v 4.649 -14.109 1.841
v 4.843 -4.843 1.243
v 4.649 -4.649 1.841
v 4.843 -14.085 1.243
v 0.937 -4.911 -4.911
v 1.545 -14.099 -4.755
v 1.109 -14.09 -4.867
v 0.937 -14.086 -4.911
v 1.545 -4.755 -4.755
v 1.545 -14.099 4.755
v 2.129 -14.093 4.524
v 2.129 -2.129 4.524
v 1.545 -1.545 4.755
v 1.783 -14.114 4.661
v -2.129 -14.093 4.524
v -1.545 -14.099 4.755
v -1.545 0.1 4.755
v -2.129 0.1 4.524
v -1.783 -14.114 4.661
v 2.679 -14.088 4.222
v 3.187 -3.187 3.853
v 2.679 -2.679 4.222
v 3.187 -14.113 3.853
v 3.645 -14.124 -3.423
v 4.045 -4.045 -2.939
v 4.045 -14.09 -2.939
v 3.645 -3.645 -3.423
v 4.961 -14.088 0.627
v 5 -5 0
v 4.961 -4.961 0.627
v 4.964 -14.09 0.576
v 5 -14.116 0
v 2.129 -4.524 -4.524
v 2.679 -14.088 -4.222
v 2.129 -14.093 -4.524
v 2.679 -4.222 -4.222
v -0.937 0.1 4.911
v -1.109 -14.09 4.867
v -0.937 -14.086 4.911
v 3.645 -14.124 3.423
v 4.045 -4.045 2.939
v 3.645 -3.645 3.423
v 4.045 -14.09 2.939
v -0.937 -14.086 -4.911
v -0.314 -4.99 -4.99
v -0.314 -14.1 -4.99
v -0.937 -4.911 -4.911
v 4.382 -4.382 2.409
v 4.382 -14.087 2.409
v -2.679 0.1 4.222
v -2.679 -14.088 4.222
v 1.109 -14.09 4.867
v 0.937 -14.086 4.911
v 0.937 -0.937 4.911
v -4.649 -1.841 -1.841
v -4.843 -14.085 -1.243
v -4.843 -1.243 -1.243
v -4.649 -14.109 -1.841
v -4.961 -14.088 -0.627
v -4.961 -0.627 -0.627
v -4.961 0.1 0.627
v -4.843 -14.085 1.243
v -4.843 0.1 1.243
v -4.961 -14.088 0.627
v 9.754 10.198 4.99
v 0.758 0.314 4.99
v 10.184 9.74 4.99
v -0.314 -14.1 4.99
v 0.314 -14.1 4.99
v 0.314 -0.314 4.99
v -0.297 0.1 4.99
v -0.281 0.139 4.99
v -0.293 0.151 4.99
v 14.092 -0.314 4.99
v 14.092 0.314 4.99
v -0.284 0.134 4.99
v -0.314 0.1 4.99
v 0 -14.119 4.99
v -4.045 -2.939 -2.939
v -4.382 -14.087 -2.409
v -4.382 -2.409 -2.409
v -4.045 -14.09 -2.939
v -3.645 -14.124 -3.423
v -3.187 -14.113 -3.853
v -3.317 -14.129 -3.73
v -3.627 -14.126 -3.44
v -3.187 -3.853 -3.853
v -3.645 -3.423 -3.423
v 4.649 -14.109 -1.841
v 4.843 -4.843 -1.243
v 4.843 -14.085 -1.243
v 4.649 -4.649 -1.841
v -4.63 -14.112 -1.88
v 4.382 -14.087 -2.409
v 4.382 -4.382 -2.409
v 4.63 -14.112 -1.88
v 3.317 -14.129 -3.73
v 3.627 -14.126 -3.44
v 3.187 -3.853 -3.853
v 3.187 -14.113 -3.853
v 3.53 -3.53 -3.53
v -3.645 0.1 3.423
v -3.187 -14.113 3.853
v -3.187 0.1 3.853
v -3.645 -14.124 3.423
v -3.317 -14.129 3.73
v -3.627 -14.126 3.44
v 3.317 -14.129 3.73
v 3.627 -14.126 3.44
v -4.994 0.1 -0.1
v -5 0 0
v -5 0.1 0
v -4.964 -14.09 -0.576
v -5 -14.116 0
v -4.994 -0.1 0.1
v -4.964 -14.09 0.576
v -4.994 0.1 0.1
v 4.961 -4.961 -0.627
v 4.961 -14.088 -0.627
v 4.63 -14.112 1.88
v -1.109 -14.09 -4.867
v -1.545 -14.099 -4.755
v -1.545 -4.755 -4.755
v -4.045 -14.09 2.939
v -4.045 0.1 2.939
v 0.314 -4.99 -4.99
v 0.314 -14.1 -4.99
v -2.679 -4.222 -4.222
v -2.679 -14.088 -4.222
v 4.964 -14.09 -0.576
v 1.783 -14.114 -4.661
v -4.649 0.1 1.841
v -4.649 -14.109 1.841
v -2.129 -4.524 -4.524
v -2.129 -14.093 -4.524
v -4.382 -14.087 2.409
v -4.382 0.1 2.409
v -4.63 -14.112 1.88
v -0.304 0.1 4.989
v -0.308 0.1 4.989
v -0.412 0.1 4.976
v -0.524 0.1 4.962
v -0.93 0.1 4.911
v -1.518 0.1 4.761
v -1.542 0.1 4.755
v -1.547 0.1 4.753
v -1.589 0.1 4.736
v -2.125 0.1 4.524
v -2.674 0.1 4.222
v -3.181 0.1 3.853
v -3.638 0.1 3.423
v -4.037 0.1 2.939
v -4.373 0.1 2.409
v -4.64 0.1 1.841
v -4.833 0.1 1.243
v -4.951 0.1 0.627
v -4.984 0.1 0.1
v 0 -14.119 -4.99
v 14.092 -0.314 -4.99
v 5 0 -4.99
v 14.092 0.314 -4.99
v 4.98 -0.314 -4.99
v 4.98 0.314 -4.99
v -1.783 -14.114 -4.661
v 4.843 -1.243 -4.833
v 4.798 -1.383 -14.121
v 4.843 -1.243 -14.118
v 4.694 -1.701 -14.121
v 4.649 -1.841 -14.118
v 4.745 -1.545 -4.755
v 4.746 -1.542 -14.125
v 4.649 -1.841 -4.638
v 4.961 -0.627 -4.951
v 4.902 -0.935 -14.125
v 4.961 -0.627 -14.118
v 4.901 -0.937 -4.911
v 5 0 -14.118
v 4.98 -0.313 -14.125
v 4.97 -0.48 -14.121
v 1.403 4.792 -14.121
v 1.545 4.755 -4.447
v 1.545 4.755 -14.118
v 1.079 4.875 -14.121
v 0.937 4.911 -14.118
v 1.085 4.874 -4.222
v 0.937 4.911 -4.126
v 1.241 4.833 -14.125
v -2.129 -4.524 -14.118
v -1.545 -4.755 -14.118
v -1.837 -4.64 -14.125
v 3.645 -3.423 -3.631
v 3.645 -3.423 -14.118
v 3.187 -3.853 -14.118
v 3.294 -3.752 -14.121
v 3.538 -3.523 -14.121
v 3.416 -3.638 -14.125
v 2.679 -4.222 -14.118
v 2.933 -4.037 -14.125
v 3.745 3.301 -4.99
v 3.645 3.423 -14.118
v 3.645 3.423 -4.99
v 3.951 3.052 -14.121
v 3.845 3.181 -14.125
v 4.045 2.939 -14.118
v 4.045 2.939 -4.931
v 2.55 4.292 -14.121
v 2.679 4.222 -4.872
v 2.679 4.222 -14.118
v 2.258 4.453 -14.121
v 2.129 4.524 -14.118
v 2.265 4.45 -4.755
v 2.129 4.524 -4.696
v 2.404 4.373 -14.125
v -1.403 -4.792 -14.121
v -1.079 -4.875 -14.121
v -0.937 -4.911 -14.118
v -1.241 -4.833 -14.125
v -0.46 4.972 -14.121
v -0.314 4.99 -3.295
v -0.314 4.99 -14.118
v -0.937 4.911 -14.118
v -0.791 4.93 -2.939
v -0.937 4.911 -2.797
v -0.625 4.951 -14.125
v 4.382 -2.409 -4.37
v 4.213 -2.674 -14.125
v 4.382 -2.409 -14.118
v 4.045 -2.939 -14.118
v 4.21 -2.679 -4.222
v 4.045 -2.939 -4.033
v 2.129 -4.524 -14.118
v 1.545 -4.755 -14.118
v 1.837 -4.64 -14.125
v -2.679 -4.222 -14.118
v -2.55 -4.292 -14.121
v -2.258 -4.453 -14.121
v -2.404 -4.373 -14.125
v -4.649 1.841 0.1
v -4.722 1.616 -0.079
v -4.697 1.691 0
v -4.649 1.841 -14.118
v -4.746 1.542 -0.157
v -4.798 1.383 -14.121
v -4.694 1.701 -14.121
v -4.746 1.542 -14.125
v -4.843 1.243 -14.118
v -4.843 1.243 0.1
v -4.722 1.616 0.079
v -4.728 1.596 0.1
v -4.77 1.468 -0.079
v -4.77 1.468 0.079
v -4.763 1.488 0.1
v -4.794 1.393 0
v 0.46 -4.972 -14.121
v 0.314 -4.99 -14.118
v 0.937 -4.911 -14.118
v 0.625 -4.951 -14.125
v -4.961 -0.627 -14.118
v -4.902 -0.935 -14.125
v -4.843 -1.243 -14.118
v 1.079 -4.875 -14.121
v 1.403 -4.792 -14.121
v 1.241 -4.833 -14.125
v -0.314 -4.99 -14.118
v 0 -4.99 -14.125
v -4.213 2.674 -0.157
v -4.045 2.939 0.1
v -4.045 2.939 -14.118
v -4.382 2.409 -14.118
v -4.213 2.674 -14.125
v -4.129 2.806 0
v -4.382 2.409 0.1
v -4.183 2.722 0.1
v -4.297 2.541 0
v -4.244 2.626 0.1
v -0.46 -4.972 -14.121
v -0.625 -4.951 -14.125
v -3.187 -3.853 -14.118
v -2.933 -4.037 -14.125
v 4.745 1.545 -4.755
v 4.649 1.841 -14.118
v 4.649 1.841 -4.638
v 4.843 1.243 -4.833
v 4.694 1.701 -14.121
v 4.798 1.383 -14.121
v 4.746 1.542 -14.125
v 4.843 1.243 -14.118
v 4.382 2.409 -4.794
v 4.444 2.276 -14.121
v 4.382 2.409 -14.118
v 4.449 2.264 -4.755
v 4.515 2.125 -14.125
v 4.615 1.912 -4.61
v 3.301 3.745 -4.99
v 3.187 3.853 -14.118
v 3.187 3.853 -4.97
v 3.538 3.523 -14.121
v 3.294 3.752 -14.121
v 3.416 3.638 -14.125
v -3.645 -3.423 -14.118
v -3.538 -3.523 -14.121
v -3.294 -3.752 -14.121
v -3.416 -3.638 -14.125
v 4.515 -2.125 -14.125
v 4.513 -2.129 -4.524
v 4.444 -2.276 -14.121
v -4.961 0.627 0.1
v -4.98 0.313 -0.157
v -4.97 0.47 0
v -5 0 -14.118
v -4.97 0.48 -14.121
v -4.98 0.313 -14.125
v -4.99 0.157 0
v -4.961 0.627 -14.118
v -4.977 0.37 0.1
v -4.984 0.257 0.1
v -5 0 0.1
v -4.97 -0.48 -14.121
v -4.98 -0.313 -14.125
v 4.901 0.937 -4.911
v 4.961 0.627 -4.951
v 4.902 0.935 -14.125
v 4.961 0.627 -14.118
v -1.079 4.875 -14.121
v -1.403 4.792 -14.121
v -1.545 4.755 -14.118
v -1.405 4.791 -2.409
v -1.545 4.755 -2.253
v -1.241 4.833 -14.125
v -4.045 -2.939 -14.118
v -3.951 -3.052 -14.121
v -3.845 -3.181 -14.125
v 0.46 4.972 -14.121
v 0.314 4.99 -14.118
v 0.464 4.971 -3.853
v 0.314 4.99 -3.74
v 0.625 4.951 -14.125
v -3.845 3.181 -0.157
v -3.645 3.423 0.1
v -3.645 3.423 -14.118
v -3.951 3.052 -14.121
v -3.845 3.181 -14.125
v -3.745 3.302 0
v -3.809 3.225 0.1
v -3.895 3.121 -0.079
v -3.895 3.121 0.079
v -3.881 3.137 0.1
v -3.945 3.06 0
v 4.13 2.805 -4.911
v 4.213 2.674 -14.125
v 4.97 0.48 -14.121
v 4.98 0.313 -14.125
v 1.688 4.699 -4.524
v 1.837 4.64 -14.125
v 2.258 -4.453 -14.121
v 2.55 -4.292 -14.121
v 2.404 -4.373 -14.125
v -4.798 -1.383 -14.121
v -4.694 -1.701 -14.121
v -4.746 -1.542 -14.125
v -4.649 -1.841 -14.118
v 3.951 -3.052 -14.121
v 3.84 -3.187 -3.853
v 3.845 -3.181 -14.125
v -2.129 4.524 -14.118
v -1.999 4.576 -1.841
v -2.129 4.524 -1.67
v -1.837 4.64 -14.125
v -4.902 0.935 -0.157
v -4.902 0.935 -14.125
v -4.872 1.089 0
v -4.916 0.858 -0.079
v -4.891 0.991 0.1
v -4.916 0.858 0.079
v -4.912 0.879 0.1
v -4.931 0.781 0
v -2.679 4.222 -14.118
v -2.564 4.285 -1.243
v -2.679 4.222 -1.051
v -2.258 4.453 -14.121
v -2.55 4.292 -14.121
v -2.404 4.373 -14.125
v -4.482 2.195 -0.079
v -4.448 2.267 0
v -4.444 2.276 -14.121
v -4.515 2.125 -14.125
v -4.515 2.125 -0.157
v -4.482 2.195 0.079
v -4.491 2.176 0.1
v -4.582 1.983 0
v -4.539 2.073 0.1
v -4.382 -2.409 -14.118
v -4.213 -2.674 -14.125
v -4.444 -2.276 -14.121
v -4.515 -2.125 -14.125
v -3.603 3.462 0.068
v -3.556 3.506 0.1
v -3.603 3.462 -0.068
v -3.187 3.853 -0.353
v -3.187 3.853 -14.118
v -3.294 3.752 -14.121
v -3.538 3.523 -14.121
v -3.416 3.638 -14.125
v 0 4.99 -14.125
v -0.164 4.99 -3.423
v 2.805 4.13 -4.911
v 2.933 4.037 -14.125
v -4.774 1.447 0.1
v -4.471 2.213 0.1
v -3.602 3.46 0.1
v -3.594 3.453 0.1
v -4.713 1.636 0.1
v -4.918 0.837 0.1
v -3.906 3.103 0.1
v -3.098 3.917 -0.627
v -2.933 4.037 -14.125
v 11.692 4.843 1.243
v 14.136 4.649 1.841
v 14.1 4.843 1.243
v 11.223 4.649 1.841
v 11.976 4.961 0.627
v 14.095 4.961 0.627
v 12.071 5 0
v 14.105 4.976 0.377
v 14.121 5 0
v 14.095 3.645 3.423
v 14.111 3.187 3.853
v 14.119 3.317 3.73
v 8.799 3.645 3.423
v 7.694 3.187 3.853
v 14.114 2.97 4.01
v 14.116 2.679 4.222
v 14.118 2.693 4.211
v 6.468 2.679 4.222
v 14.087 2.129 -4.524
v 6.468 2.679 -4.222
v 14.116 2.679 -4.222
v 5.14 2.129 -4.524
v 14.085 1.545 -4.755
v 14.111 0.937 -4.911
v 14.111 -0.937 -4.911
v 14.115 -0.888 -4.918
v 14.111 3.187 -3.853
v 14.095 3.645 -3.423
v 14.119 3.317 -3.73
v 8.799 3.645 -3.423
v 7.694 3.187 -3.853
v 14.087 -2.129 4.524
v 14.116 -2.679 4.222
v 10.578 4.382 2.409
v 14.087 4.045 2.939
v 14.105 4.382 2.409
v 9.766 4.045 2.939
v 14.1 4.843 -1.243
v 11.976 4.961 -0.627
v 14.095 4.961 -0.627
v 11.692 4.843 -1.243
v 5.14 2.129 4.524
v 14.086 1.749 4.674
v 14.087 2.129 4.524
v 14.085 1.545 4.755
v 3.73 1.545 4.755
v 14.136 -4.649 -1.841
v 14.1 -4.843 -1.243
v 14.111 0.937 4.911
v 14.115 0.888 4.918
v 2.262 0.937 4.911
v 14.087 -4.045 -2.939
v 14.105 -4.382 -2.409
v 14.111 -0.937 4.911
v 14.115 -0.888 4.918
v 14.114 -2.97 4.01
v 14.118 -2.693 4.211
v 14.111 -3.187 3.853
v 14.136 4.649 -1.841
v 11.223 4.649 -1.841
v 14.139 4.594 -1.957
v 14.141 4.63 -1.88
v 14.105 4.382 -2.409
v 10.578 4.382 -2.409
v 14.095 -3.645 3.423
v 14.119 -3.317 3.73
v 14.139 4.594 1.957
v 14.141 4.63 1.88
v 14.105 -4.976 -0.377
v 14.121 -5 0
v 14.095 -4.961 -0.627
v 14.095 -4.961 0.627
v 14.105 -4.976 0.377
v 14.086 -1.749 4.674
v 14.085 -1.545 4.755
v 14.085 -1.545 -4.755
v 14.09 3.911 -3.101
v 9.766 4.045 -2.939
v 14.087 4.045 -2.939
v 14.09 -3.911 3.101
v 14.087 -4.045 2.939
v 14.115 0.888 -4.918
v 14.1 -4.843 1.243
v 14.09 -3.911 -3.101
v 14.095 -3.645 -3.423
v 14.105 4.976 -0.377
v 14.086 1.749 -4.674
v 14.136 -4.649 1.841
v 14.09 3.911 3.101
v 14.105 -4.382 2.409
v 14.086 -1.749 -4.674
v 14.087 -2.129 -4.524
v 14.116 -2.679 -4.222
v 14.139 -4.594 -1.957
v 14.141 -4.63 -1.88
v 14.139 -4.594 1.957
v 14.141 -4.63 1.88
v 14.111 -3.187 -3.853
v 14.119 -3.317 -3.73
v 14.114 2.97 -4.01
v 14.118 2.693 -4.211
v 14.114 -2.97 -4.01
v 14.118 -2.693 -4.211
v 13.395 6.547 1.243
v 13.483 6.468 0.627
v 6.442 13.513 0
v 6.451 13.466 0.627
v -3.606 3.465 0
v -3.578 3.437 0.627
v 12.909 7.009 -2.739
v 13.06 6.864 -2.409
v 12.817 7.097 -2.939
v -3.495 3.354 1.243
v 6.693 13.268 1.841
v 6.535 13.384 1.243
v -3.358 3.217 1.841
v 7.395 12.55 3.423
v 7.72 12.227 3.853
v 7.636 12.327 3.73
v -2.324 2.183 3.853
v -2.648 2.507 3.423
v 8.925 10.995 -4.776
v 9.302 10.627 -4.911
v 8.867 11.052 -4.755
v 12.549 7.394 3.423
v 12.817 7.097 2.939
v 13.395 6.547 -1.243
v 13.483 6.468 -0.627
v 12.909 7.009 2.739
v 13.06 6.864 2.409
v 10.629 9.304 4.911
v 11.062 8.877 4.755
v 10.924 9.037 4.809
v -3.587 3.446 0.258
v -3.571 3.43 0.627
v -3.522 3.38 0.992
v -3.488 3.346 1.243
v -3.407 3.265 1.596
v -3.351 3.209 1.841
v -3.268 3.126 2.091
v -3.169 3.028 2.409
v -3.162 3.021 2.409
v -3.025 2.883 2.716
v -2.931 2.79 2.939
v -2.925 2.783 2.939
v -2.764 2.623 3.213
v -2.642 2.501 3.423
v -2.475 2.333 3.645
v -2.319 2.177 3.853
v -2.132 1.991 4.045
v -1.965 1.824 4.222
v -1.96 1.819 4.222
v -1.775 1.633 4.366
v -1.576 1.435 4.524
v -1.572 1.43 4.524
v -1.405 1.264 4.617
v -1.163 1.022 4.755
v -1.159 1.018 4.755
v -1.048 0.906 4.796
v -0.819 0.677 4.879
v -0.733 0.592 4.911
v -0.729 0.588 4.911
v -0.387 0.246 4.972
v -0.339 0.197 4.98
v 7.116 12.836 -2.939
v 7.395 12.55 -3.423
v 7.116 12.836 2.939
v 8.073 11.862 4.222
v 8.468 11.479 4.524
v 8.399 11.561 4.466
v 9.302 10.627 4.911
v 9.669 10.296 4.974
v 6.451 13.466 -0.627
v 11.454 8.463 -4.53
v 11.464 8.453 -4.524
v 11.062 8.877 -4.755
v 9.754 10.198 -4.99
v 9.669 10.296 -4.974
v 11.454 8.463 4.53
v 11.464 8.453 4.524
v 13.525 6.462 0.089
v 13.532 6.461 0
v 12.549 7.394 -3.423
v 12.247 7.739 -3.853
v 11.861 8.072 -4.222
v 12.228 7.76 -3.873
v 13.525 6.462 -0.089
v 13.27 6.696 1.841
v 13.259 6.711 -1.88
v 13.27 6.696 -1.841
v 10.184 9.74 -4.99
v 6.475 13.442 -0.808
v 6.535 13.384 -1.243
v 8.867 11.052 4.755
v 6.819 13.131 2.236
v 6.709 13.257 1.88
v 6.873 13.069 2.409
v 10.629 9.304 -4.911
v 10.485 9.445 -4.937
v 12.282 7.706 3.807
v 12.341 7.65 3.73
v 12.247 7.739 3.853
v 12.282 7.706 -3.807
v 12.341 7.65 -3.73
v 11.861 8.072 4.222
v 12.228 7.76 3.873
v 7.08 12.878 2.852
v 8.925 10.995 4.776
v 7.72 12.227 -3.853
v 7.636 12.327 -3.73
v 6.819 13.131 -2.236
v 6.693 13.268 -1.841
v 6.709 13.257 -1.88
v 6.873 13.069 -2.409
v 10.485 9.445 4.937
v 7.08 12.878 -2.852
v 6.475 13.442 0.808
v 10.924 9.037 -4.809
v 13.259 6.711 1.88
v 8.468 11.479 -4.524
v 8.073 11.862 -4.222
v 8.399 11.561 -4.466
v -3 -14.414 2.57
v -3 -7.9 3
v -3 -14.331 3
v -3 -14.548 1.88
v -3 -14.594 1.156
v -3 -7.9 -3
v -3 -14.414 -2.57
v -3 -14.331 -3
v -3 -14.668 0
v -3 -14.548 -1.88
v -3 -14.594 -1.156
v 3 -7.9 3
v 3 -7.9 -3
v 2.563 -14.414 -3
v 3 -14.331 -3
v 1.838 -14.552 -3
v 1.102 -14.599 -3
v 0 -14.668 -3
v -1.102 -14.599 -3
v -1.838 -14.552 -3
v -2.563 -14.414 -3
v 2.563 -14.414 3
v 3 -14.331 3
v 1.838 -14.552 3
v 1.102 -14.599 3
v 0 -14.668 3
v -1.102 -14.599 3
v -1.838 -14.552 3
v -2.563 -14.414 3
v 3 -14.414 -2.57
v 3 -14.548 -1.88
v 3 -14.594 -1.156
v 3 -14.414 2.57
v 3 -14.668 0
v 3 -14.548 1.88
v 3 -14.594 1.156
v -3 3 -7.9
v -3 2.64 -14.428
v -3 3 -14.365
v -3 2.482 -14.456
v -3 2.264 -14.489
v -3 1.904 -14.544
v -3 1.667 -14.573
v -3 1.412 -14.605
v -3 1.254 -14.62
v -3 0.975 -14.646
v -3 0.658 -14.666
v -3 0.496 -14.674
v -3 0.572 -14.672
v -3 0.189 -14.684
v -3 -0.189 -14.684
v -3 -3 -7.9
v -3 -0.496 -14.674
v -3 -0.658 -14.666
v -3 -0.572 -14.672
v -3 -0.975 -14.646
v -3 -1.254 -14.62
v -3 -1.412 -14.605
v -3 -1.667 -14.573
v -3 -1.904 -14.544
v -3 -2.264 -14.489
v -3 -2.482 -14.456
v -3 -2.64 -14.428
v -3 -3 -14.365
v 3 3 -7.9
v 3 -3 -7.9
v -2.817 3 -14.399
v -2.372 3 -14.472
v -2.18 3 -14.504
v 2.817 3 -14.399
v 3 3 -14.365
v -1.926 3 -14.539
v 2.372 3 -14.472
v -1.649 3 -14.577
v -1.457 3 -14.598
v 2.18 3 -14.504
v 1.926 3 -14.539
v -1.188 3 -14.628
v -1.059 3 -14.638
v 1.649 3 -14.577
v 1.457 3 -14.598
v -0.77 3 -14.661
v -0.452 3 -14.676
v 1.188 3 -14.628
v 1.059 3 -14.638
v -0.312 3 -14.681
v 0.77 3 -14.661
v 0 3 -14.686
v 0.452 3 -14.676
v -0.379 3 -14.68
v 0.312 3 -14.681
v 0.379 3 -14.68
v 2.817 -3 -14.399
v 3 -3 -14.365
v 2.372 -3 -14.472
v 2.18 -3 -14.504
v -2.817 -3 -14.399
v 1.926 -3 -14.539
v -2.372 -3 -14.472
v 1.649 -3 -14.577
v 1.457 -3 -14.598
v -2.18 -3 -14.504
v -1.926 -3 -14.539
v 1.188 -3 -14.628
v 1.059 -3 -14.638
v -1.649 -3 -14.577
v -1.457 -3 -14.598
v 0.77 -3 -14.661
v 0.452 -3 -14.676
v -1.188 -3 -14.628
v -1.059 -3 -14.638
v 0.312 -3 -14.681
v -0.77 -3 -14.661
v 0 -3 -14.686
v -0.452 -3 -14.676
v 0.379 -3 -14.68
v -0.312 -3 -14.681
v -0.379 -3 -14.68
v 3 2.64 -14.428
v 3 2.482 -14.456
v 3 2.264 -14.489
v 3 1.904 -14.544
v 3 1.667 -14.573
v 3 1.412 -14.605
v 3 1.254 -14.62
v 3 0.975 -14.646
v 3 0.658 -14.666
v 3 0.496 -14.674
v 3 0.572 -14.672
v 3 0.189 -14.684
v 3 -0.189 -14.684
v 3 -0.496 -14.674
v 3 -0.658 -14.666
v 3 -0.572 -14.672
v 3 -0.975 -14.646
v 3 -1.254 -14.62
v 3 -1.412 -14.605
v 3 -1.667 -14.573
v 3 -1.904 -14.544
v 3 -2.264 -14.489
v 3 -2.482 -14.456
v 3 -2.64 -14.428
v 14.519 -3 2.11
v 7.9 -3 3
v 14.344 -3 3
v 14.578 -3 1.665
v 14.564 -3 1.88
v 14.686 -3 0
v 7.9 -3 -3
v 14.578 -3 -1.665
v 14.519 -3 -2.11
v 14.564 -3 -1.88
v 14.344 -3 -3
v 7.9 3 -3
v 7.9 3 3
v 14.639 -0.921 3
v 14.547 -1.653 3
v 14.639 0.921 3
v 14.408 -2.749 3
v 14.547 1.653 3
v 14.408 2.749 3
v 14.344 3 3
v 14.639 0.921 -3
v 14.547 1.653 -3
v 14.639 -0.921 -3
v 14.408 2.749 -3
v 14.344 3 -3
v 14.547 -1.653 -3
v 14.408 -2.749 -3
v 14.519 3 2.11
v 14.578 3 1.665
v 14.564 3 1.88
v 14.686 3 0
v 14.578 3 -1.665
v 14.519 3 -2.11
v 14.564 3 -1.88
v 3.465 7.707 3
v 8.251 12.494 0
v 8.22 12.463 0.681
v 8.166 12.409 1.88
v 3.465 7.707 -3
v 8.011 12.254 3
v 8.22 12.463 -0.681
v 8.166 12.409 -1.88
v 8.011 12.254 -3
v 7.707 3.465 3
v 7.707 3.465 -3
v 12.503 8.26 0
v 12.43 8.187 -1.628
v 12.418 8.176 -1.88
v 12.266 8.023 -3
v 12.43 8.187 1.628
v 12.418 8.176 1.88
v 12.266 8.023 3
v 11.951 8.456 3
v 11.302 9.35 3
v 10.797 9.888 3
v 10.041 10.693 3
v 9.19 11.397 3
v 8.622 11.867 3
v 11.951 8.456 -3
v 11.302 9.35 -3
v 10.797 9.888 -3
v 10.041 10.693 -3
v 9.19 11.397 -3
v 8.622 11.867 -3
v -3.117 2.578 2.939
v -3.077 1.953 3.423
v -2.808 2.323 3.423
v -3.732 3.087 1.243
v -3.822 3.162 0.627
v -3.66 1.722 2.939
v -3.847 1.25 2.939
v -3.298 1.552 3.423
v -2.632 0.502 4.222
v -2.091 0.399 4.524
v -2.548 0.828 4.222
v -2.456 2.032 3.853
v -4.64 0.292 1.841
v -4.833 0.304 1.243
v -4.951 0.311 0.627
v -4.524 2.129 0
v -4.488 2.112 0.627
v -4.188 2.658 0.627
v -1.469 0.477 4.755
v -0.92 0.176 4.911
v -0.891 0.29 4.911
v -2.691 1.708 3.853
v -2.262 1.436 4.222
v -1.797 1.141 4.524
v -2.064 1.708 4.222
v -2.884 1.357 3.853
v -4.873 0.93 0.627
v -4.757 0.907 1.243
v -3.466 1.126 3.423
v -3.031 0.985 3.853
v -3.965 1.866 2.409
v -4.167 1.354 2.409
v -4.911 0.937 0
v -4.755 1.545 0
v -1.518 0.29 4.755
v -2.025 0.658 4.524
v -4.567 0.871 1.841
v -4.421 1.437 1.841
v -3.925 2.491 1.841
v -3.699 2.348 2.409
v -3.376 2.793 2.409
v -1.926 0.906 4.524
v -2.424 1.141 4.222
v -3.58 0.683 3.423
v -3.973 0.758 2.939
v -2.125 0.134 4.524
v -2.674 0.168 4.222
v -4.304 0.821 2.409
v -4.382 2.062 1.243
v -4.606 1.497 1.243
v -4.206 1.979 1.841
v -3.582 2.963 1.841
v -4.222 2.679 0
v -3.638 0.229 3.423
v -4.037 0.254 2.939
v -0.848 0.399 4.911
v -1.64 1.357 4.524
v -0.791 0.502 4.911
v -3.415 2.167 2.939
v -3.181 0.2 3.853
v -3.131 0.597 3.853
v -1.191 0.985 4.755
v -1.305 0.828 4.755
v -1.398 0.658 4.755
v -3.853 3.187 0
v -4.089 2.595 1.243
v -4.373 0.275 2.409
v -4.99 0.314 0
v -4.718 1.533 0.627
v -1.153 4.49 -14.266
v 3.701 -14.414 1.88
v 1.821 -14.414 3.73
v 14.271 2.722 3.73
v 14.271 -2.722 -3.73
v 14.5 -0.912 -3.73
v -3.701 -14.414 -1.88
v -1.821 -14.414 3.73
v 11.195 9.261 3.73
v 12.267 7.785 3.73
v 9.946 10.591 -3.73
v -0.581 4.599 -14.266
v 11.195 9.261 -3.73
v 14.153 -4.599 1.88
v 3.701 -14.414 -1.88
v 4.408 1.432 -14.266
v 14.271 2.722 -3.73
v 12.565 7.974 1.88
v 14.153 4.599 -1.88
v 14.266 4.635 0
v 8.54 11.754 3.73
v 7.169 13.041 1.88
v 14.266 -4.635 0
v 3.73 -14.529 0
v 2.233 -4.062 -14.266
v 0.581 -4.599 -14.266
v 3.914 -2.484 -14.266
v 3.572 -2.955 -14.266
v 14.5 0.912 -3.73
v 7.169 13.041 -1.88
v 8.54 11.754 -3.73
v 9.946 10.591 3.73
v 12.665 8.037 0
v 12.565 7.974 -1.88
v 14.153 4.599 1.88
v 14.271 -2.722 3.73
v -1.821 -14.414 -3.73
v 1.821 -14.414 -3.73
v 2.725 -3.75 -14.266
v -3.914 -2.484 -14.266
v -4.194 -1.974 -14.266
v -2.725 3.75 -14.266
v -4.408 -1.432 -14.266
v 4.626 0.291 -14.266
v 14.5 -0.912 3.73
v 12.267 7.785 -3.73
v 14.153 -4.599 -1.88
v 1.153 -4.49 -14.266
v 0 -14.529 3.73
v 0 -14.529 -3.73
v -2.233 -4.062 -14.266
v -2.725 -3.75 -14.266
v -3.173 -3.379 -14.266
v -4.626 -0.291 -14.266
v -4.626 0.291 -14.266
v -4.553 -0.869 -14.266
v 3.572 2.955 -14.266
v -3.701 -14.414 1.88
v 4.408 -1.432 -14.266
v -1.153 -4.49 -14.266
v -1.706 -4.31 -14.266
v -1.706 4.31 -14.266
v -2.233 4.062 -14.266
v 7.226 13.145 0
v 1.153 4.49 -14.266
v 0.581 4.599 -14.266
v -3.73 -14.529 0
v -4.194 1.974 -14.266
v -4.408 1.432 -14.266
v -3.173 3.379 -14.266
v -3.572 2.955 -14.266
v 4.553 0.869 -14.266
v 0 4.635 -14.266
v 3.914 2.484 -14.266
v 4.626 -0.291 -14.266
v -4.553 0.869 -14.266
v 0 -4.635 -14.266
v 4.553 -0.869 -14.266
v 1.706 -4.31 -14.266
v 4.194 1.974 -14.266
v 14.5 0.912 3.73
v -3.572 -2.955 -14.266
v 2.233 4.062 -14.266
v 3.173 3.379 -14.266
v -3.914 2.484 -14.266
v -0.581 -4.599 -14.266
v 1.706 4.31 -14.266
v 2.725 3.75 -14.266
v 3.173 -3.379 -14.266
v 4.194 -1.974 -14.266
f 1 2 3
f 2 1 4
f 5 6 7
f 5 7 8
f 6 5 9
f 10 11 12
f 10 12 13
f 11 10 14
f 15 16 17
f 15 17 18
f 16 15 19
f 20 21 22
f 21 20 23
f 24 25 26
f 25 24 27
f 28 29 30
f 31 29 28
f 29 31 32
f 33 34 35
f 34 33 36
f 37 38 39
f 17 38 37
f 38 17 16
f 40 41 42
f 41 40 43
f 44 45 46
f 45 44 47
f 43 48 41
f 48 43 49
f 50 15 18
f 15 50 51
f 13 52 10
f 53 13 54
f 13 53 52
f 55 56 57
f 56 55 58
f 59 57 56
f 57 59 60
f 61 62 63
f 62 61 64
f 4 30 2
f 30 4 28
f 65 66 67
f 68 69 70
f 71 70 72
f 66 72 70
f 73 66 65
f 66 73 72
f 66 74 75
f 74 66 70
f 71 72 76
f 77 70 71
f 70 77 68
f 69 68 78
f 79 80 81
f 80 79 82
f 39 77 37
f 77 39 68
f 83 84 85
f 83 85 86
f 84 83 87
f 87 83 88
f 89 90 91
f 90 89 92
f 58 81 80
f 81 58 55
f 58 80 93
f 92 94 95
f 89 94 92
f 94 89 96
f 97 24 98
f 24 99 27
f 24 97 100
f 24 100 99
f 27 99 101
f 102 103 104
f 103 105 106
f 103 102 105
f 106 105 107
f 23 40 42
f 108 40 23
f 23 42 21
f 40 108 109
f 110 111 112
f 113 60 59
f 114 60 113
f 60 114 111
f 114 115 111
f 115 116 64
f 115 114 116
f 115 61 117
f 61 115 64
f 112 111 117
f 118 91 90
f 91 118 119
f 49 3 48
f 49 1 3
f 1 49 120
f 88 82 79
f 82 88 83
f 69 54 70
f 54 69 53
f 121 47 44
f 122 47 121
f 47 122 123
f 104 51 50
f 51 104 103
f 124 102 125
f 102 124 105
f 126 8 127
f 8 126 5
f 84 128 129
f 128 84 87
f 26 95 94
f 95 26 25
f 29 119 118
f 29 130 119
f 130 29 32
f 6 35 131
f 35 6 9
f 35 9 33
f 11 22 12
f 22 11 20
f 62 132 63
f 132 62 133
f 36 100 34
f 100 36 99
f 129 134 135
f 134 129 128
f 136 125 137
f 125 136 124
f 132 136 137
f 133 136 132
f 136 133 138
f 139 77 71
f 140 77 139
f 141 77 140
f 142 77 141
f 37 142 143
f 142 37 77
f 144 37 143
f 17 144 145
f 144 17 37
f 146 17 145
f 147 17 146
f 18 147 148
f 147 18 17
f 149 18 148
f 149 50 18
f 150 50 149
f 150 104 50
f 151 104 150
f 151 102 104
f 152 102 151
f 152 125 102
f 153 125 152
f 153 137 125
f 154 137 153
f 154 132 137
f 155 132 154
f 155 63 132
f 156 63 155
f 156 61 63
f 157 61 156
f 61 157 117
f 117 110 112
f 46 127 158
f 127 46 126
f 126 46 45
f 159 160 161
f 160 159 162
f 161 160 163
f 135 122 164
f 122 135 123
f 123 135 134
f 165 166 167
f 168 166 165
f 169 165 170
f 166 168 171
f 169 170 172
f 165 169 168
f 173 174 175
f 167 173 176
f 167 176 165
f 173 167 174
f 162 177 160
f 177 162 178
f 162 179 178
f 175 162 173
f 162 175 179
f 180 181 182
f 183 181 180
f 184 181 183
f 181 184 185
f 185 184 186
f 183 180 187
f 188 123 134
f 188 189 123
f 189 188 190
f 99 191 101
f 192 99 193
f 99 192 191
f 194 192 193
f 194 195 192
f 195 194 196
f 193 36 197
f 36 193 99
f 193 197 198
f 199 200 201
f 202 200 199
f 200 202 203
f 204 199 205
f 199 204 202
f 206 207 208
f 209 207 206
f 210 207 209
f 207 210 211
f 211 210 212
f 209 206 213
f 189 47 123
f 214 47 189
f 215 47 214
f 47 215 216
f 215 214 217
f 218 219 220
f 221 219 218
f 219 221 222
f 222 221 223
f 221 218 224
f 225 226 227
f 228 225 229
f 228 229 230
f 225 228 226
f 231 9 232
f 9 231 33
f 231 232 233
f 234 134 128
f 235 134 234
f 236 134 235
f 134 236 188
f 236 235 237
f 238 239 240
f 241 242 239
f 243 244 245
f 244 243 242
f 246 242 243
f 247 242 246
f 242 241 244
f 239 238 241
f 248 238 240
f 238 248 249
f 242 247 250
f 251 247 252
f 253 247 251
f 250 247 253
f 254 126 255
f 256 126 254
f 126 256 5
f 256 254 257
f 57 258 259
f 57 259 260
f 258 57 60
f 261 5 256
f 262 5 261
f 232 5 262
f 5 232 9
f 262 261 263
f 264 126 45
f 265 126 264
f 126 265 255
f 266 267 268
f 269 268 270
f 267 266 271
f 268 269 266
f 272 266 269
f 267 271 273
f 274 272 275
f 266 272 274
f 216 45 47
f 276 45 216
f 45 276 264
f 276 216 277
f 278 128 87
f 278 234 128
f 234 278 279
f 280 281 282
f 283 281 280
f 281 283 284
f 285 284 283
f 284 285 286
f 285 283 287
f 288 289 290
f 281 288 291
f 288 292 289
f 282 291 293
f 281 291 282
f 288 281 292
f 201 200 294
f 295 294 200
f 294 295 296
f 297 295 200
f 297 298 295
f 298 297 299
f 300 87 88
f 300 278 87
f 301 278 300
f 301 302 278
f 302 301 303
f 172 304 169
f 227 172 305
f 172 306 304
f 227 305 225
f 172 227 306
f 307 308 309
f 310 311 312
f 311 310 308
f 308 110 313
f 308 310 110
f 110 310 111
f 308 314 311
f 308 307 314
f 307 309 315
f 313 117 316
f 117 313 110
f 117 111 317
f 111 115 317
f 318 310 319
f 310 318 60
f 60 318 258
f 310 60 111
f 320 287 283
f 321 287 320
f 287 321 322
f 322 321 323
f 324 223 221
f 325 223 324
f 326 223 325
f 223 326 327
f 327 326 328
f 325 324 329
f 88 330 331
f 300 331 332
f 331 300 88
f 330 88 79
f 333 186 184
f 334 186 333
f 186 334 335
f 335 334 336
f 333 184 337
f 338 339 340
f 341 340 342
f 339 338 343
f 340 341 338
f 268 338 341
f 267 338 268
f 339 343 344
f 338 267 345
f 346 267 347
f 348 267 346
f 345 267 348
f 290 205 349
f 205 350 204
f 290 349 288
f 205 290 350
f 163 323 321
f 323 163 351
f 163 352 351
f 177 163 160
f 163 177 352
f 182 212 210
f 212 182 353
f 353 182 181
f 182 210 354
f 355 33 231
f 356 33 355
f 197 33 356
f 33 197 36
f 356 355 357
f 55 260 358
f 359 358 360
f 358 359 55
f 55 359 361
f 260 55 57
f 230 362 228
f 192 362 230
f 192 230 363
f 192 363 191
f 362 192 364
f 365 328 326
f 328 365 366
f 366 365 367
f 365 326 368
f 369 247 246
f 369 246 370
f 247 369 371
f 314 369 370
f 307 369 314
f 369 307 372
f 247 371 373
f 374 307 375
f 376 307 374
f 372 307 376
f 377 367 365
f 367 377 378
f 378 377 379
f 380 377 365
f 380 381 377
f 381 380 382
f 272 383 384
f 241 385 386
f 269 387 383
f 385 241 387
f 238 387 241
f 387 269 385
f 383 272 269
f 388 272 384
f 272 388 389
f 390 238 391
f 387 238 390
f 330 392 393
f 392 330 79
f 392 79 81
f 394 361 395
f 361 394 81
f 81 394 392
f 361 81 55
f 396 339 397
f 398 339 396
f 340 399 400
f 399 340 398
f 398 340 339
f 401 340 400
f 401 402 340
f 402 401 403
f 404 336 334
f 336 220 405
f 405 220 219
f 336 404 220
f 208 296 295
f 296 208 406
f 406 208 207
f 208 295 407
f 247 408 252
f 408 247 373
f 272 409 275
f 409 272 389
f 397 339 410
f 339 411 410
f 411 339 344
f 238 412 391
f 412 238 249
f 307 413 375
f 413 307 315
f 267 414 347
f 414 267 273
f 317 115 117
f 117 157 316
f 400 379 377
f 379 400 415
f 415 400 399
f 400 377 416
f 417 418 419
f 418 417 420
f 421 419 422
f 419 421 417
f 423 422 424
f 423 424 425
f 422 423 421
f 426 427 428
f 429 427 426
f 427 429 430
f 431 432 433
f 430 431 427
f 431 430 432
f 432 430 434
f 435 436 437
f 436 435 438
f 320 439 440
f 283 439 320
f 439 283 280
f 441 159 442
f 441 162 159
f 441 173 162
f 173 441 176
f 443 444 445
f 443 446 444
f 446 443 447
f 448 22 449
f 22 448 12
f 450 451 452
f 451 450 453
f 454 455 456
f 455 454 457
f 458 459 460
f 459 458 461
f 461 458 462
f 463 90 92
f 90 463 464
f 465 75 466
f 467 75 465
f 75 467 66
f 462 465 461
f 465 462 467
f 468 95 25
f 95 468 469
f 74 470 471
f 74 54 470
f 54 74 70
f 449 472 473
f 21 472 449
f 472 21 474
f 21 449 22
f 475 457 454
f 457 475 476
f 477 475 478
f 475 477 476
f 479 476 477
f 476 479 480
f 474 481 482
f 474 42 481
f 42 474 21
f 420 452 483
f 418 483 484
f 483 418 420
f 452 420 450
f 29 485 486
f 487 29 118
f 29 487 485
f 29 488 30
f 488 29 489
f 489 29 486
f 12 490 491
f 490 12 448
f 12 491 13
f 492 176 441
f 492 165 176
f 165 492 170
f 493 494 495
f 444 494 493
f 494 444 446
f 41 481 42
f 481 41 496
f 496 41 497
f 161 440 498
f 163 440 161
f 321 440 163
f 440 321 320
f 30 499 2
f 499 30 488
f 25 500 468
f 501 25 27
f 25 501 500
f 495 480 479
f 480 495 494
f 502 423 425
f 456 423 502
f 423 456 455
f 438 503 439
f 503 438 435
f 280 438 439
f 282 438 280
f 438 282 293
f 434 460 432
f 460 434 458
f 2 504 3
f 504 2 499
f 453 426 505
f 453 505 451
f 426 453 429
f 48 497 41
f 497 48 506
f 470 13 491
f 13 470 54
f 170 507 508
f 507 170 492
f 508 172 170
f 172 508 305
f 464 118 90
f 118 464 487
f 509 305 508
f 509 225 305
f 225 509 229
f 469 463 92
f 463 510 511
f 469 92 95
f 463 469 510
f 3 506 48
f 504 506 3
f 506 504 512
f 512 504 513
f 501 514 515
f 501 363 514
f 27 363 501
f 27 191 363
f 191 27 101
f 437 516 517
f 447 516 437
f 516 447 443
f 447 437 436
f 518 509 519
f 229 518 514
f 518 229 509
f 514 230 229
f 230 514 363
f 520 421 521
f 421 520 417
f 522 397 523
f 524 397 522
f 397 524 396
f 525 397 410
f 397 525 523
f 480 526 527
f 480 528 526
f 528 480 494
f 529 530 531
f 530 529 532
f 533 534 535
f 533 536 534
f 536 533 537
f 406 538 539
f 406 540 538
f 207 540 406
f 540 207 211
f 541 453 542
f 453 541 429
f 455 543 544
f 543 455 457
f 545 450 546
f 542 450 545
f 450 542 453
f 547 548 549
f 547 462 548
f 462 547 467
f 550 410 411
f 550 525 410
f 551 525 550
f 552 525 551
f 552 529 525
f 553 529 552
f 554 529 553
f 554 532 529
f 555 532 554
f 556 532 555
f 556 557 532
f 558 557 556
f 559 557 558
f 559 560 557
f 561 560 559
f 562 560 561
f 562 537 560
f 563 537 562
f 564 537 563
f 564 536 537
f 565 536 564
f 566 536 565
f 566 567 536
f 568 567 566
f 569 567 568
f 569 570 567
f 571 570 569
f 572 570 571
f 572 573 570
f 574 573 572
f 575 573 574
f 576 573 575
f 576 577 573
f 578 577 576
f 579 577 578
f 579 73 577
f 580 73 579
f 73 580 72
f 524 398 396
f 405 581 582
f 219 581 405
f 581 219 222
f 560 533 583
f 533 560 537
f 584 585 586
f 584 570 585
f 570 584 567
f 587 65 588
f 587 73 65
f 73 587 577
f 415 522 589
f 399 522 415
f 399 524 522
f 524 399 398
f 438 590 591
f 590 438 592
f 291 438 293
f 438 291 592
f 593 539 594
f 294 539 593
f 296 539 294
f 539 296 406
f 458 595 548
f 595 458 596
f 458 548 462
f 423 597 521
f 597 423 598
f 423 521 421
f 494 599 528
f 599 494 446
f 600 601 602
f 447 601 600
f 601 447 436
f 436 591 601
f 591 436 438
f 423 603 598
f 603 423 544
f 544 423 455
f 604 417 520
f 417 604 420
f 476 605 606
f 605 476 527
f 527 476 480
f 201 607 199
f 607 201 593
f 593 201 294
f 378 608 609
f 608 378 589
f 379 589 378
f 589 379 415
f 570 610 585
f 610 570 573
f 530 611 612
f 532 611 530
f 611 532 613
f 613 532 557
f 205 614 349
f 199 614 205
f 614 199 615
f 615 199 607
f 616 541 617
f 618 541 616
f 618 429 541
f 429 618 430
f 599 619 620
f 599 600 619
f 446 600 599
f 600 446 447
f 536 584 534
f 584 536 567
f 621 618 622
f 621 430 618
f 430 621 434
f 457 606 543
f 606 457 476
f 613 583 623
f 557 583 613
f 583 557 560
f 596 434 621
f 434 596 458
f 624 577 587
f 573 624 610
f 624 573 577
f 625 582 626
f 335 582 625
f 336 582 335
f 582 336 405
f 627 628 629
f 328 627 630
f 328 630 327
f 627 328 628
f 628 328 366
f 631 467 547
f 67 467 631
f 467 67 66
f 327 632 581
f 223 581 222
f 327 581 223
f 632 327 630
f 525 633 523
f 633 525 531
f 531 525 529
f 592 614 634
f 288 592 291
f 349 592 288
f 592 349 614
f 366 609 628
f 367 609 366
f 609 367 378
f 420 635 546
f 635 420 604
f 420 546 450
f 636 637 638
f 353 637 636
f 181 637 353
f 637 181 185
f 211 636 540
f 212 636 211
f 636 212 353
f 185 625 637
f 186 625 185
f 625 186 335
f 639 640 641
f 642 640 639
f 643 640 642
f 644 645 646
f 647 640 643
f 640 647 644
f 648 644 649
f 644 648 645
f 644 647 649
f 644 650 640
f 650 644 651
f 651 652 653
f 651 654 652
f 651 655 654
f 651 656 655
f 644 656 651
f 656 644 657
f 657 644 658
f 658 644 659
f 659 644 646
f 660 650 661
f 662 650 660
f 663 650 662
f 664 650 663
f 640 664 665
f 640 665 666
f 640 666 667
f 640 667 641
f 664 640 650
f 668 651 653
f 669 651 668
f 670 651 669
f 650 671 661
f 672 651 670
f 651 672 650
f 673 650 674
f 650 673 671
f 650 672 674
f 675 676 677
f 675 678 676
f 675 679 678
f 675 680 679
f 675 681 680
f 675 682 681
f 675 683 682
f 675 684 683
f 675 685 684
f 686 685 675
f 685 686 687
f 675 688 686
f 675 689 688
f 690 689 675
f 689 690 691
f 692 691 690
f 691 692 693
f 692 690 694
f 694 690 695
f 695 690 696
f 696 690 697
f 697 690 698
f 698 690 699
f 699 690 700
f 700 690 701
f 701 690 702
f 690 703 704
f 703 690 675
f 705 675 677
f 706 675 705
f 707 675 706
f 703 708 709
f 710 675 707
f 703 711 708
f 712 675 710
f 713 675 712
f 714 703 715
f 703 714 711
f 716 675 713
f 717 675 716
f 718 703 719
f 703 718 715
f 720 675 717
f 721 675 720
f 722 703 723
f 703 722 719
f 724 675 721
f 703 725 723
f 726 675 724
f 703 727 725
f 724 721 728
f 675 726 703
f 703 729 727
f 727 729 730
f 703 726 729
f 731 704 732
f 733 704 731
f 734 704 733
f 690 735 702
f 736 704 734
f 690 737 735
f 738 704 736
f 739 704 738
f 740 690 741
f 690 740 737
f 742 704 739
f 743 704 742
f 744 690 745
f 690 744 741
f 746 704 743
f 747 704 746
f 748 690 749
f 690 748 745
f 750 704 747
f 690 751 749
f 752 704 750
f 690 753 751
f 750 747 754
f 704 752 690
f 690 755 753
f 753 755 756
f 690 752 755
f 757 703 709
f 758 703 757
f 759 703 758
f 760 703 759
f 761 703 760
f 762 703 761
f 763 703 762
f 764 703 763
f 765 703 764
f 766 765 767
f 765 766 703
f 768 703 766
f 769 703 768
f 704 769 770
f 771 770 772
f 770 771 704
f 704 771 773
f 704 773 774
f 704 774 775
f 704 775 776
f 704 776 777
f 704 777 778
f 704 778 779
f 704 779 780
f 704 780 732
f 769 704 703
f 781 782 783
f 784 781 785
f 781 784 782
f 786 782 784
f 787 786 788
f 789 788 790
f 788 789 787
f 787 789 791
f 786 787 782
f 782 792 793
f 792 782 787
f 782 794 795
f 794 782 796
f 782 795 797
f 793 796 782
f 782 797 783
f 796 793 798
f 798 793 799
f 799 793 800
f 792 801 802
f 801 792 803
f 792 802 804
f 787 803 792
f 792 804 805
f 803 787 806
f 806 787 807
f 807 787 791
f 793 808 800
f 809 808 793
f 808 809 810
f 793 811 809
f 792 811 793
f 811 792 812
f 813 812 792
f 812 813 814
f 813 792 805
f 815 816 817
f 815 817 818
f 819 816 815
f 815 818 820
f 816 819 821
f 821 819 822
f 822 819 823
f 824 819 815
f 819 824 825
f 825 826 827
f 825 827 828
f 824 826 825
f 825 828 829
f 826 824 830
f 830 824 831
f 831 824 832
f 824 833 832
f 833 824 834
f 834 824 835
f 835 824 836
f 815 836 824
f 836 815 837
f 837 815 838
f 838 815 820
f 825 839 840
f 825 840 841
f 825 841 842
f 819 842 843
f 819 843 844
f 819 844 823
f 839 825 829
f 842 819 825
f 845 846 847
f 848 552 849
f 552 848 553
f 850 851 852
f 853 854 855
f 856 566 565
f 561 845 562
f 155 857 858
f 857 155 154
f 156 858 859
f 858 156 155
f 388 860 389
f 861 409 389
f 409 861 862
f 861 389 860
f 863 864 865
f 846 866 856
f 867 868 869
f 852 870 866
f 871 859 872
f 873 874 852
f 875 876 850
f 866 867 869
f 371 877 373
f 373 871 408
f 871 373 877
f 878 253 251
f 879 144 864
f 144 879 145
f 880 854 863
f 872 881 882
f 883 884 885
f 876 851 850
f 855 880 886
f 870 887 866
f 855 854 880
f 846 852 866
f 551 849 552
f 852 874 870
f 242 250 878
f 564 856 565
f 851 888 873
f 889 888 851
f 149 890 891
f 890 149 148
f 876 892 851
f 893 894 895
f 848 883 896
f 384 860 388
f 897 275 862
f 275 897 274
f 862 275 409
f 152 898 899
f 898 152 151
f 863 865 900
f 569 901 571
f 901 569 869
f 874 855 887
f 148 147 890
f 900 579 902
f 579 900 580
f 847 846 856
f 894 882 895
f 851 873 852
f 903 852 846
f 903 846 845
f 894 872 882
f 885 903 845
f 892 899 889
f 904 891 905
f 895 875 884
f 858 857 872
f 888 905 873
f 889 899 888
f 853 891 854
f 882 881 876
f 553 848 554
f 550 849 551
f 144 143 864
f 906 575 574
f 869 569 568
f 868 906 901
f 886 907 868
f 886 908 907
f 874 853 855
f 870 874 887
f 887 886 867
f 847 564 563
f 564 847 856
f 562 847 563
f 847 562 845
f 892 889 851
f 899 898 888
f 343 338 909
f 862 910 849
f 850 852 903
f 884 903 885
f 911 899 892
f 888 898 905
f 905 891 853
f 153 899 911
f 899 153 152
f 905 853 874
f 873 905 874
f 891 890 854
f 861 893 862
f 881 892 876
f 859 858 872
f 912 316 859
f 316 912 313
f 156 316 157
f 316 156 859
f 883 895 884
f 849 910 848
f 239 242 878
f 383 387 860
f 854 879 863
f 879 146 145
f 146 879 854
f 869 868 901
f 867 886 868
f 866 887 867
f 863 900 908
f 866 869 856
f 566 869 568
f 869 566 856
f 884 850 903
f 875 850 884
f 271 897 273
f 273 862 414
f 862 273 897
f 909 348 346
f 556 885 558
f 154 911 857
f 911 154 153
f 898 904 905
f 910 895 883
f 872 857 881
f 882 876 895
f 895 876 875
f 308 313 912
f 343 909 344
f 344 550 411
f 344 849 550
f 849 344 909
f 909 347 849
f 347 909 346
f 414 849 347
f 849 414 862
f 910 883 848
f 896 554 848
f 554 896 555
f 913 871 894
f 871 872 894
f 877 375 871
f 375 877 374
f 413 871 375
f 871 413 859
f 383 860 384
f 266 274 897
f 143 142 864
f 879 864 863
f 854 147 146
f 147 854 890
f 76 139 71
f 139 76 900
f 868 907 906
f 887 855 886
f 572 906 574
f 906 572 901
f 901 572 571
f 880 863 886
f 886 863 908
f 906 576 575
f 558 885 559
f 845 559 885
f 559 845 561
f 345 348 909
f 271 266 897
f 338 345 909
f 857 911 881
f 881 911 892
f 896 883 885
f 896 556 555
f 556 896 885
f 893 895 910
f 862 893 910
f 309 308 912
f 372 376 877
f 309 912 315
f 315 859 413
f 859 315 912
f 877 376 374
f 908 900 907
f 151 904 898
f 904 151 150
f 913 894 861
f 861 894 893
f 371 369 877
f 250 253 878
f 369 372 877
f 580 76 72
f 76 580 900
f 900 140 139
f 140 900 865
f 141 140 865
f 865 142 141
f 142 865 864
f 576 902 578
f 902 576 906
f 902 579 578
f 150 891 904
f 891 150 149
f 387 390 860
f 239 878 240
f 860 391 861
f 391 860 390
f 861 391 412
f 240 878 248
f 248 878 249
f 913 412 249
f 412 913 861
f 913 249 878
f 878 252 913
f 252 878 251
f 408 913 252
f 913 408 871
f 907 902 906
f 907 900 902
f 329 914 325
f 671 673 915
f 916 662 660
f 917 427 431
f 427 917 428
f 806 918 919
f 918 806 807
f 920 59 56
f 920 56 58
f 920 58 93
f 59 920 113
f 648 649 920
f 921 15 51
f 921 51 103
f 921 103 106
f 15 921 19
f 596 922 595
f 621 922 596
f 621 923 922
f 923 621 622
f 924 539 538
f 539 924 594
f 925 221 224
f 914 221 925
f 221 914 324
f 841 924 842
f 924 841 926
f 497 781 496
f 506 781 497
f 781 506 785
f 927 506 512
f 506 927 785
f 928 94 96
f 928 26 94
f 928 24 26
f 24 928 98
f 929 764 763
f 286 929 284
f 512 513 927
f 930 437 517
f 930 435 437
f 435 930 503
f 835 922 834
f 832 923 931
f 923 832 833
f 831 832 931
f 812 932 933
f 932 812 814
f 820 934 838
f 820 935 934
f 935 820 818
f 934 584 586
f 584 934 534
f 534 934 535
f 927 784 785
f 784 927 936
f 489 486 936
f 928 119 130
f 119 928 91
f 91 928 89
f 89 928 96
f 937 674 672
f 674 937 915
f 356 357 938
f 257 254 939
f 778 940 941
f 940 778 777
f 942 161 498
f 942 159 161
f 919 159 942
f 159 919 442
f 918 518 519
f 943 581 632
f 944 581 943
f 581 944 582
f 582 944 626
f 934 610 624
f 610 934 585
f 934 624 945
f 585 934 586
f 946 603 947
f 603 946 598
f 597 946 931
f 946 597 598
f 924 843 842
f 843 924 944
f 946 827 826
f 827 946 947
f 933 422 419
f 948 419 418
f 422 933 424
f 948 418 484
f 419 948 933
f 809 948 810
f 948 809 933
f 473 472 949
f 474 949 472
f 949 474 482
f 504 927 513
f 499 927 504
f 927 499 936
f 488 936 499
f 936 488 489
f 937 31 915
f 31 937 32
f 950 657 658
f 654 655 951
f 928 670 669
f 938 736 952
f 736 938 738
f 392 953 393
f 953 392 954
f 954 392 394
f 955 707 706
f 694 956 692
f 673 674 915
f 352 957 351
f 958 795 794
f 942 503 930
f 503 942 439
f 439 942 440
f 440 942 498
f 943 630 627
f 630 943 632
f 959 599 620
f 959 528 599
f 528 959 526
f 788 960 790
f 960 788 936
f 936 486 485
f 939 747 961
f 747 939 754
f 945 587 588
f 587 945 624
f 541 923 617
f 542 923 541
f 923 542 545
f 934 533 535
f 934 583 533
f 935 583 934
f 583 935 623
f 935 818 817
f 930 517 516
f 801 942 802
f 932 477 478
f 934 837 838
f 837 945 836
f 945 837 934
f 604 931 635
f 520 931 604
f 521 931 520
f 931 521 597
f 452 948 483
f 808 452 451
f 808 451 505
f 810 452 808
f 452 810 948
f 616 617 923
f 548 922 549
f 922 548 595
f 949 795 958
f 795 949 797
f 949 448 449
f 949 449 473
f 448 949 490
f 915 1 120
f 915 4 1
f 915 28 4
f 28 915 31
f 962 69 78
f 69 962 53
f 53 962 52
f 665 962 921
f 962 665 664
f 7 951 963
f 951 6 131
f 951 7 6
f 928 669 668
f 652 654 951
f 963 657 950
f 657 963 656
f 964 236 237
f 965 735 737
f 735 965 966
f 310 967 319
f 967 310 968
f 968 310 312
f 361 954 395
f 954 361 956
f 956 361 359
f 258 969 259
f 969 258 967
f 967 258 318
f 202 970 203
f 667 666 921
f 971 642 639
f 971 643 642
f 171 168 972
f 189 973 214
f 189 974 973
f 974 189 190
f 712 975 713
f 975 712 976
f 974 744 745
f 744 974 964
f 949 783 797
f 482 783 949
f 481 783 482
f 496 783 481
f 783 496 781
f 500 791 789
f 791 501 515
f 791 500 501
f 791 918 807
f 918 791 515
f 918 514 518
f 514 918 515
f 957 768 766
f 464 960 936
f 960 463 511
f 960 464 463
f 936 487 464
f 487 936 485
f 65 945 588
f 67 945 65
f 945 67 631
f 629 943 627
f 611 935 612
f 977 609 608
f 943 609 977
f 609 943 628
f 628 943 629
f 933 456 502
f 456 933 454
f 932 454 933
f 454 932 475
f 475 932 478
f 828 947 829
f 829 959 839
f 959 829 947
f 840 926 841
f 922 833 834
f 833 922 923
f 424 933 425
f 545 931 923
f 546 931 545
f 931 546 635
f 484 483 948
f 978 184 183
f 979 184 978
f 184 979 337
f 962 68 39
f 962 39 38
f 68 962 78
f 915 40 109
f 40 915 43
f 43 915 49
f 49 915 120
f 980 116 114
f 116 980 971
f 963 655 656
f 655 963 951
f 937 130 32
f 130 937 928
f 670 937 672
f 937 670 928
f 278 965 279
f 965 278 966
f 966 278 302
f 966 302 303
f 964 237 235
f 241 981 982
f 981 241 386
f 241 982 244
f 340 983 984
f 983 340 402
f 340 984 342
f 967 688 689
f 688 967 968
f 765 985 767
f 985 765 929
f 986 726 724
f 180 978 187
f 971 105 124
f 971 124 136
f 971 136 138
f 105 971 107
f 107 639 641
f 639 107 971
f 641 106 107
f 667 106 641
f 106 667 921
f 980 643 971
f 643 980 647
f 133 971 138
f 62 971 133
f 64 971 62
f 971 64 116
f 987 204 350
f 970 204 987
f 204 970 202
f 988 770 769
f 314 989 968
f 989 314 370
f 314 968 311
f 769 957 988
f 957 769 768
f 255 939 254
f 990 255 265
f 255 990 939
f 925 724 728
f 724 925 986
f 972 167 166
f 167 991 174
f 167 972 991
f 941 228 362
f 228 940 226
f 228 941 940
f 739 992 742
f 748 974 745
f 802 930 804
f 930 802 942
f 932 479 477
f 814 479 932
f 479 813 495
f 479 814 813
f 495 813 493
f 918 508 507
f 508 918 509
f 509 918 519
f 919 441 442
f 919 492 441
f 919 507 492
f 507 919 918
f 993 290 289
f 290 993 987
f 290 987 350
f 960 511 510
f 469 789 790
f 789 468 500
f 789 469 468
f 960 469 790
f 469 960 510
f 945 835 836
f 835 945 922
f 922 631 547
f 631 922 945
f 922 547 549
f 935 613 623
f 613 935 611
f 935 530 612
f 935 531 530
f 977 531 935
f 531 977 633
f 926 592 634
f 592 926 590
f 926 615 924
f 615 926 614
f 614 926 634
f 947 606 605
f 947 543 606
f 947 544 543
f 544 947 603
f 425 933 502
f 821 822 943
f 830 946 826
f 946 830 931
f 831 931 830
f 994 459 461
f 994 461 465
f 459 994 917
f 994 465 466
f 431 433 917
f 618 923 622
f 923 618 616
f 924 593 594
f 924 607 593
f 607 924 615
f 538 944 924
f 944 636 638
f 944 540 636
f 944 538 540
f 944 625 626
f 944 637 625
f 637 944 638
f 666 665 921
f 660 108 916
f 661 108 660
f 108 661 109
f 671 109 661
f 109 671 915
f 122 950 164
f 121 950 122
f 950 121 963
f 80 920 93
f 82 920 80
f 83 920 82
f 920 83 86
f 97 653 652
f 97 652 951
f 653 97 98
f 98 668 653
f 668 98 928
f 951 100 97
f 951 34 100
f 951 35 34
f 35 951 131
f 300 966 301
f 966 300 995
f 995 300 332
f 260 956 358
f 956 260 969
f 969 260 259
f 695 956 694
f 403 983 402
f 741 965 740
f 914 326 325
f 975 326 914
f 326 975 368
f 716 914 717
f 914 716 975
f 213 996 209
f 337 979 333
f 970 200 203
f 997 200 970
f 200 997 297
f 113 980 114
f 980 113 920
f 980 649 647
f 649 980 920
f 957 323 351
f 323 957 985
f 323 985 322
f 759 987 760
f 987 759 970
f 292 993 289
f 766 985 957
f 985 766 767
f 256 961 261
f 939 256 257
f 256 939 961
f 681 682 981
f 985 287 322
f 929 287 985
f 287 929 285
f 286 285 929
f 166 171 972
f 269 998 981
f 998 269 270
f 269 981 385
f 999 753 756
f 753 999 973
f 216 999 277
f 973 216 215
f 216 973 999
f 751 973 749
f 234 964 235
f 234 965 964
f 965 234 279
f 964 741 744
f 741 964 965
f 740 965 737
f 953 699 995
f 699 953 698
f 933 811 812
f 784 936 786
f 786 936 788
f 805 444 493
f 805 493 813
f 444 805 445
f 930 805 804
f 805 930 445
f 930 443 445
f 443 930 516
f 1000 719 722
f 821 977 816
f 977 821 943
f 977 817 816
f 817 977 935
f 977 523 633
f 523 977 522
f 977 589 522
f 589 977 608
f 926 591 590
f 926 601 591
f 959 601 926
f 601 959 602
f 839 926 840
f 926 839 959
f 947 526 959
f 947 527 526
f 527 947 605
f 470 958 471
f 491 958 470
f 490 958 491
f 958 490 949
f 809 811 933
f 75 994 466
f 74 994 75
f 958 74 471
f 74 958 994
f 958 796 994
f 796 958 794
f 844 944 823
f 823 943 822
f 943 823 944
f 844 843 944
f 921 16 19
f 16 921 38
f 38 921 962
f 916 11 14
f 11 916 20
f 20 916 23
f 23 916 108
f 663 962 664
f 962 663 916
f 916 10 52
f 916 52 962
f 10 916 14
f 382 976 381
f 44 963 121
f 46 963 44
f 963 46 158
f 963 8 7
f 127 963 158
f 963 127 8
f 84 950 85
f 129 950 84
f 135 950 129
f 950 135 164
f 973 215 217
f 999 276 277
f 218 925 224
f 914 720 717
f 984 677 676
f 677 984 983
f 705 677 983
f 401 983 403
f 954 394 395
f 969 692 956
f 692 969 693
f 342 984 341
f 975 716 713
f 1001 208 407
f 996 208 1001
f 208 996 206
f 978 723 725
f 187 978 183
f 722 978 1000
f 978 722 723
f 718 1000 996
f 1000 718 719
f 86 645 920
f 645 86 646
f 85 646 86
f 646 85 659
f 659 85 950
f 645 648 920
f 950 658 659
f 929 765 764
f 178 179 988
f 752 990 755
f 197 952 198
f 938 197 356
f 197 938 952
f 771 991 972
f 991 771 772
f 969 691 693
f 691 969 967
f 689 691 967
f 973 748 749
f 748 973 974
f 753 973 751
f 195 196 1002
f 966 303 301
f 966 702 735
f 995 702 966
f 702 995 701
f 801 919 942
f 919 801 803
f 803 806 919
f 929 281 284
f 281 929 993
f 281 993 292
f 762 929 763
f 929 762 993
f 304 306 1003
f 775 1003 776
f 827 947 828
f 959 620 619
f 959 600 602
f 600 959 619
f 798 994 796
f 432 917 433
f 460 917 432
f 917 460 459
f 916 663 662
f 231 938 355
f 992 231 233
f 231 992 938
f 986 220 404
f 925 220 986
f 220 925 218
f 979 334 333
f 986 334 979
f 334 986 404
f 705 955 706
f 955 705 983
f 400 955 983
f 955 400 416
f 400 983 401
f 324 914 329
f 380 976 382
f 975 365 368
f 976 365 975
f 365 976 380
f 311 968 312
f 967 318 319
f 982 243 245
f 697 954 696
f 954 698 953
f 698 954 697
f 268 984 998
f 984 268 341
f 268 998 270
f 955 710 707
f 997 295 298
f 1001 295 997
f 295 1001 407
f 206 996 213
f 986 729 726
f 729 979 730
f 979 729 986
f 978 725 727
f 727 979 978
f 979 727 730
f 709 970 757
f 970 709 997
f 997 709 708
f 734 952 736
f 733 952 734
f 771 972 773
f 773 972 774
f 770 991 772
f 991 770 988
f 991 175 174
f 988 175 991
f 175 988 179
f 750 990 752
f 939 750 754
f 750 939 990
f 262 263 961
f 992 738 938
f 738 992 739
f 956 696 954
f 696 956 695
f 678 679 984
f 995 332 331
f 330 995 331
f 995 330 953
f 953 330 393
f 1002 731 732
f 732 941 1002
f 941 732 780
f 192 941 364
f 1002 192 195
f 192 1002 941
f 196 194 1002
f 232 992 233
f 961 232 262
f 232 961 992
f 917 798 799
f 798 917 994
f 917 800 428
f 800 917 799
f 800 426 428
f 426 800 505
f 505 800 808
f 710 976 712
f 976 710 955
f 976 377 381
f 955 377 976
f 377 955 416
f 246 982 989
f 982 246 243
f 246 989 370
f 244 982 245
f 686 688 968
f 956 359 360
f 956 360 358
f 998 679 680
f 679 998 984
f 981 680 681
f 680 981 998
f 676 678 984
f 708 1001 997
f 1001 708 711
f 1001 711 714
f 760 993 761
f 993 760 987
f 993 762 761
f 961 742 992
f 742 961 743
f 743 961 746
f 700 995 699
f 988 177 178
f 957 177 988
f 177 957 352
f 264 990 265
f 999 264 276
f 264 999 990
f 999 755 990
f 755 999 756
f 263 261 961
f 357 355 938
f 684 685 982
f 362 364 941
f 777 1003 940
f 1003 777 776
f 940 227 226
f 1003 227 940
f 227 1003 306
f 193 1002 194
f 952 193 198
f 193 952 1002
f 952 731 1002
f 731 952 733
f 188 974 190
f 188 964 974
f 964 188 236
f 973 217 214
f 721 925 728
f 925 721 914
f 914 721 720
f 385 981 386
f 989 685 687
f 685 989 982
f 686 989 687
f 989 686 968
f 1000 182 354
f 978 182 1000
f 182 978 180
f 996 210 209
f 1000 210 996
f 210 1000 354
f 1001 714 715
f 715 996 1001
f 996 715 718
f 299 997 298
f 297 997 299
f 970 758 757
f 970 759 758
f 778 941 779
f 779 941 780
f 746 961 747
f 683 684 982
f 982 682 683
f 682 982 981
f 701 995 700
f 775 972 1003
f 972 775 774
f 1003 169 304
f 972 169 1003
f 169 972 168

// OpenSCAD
data = "00000,270,090,270,180,000,090,045,090";
// max id : 16383 : 14 bits de data et 2 bits de parité

width = 10;
edge_length = 15;
hole_width = 6;
hole_deep = 8;

csv = search(",", data, 20)[0];
id = longStrToNumber(str(data[0], data[1], data[2], data[3], data[4]));
v = [p2i(0), p2i(1), p2i(2), p2i(3), p2i(4), p2i(5), p2i(6), p2i(7), p2i(8), p2i(9), p2i(10), p2i(11)];

part([[v[0],v[1]], [v[2],v[3]], [v[4],v[5]], [v[6],v[7]], [v[8],v[9]], [v[10],v[11]]]);

// function int_to_bin(code, i=0, v) = (i>0) ? int_to_bin(code, i-1, v) : v[i]=;

module code(code)
{
	square_width = hole_width/4;

	// À remplacer par une fonction recursive
	tab = [int2bin(code, 0), int2bin(code, 1), int2bin(code, 2), int2bin(code, 3),
			int2bin(code, 4), int2bin(code, 5), int2bin(code, 6), int2bin(code, 7),
			int2bin(code, 8), int2bin(code, 9), int2bin(code, 10), int2bin(code, 11),
			int2bin(code, 12), int2bin(code, 13)];

	pb0 = int2bin(sumv(tab, 13), 0);
	pb1 = int2bin(sumv(tab, 13), 1);
	
	translate([-hole_width/2, -hole_width/2, edge_length-hole_deep-1]) linear_extrude(height = edge_length) {
		for(i = [0:13]) {
			if (int2bin(code, i) == 1)
				translate([(i%4)*square_width, floor(i/4)*square_width, 0])
					square(square_width);
		}
		
		if (pb0 == 1)
			translate([2*square_width, 3*square_width, 0]) square(square_width);
		if (pb1 == 1)
			translate([3*square_width, 3*square_width, 0]) square(square_width);
	}
}

module part(v)
{
	$fn = 50;
	
	rotate([0,0,90]) intersection() {
		sphere(r = edge_length);
		union() {
			sphere(width/2);
			difference() {
				for(i = [0:len(v)-1])
					if (v[i][1] != undef && v[i][0] != undef)
						rotate([v[i][1], 0, v[i][0]])
							block(width, edge_length, circular=true);
		
			for(i = [0:len(v)-1])
					if (v[i][1] != undef && v[i][0] != undef)
						rotate([v[i][1], 0, v[i][0]]) code(id);
		
				for(i = [0:len(v)-1])
					if (v[i][1] != undef && v[i][0] != undef)
						rotate([v[i][1], 0, v[i][0]]) translate([0, 0, edge_length - hole_deep + 1])
							block(hole_width, hole_deep);
			}
		}
	}
}

module block(block_width, length, circular = false)
{
	length = (length == 0) ? width : length;
	translate ([0, 0, length/2-0.1])
		if (circular)
			cylinder(r=block_width/2, h=length, center=true);			
		else
			cube([block_width, block_width, length], center=true);
}

function bevel(type, ref) = (type == "thin") ? ref*0.2 : (type == "medium") ? ref*0.3 : (type == "large") ? ref*0.6 : 0;

function sumv(v,i,s=0) = (i==s ? v[i] : v[i] + sumv(v,i-1,s));

function int2bin(nb, i) = floor( nb/pow(2, i) ) % 2;

function p2i(index) = strToNumber(str(
		data[csv[index]+1],
		data[csv[index]+2],
		data[csv[index]+3]));

function strToNumber(str) = (
		search(str[2],"0123456789")[0] +
		10 * search(str[1],"0123456789")[0] +
		100 * search(str[0],"0123456789")[0]);

function longStrToNumber(str) = (
		search(str[4],"0123456789")[0] +
		10 * search(str[3],"0123456789")[0] +
		100 * search(str[2],"0123456789")[0] +
		1000 * search(str[1],"0123456789")[0] +
		10000 * search(str[0],"0123456789")[0]);
